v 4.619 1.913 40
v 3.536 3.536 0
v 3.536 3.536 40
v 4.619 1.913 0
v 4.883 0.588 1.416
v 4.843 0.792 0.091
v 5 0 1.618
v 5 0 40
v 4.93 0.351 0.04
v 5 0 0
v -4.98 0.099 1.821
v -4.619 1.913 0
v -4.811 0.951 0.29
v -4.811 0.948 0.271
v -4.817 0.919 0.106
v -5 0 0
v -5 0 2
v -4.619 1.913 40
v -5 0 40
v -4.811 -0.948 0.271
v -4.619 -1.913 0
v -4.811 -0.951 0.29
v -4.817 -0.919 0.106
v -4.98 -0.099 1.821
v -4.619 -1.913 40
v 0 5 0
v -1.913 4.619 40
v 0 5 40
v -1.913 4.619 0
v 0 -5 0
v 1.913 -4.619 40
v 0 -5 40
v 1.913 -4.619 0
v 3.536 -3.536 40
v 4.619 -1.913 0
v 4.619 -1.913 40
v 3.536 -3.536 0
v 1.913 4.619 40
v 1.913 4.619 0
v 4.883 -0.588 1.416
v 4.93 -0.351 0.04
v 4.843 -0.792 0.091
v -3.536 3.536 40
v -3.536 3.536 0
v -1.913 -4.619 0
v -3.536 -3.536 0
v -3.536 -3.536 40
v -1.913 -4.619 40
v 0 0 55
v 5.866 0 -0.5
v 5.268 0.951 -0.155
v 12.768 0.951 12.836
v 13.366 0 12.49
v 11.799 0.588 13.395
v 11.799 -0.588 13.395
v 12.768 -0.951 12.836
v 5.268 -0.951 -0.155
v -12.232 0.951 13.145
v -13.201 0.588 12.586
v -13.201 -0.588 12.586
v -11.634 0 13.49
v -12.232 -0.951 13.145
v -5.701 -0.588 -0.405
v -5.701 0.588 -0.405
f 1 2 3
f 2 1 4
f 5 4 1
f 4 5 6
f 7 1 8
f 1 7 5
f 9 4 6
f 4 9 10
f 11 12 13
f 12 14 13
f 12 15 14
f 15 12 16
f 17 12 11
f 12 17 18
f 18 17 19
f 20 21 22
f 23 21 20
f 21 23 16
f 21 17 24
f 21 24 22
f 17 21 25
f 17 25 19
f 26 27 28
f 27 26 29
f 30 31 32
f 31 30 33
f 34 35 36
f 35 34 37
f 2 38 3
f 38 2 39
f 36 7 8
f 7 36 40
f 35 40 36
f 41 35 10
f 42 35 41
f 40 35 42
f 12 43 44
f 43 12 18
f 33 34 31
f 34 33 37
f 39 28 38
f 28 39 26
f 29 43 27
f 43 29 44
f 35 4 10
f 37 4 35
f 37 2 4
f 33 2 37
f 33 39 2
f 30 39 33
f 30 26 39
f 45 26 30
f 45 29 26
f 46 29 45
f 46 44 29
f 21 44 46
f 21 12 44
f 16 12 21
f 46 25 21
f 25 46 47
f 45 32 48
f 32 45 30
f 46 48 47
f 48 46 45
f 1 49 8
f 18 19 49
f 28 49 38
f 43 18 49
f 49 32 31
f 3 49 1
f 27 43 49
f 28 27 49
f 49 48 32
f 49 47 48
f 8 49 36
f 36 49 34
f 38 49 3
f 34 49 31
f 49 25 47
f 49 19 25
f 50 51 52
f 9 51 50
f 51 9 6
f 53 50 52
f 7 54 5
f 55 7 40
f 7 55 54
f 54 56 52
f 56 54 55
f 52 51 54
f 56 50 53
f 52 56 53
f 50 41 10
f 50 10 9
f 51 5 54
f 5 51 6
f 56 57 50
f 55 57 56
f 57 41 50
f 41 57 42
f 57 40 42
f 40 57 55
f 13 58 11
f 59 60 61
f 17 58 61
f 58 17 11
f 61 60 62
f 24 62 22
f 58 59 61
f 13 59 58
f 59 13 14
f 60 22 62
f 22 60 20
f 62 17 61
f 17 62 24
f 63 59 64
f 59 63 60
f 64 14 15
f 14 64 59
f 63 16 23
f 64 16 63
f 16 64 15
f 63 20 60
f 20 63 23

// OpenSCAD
union() {
  cylinder(h=40, r=5);
  translate([0,0,40]) cylinder(h=15, r1=5, r2=0);
  translate([5,0,0]) rotate([0,30,0]) cylinder(h=15, r=1);
  translate([-5,0,0]) rotate([0,-30,0]) cylinder(h=15, r=1);
}
